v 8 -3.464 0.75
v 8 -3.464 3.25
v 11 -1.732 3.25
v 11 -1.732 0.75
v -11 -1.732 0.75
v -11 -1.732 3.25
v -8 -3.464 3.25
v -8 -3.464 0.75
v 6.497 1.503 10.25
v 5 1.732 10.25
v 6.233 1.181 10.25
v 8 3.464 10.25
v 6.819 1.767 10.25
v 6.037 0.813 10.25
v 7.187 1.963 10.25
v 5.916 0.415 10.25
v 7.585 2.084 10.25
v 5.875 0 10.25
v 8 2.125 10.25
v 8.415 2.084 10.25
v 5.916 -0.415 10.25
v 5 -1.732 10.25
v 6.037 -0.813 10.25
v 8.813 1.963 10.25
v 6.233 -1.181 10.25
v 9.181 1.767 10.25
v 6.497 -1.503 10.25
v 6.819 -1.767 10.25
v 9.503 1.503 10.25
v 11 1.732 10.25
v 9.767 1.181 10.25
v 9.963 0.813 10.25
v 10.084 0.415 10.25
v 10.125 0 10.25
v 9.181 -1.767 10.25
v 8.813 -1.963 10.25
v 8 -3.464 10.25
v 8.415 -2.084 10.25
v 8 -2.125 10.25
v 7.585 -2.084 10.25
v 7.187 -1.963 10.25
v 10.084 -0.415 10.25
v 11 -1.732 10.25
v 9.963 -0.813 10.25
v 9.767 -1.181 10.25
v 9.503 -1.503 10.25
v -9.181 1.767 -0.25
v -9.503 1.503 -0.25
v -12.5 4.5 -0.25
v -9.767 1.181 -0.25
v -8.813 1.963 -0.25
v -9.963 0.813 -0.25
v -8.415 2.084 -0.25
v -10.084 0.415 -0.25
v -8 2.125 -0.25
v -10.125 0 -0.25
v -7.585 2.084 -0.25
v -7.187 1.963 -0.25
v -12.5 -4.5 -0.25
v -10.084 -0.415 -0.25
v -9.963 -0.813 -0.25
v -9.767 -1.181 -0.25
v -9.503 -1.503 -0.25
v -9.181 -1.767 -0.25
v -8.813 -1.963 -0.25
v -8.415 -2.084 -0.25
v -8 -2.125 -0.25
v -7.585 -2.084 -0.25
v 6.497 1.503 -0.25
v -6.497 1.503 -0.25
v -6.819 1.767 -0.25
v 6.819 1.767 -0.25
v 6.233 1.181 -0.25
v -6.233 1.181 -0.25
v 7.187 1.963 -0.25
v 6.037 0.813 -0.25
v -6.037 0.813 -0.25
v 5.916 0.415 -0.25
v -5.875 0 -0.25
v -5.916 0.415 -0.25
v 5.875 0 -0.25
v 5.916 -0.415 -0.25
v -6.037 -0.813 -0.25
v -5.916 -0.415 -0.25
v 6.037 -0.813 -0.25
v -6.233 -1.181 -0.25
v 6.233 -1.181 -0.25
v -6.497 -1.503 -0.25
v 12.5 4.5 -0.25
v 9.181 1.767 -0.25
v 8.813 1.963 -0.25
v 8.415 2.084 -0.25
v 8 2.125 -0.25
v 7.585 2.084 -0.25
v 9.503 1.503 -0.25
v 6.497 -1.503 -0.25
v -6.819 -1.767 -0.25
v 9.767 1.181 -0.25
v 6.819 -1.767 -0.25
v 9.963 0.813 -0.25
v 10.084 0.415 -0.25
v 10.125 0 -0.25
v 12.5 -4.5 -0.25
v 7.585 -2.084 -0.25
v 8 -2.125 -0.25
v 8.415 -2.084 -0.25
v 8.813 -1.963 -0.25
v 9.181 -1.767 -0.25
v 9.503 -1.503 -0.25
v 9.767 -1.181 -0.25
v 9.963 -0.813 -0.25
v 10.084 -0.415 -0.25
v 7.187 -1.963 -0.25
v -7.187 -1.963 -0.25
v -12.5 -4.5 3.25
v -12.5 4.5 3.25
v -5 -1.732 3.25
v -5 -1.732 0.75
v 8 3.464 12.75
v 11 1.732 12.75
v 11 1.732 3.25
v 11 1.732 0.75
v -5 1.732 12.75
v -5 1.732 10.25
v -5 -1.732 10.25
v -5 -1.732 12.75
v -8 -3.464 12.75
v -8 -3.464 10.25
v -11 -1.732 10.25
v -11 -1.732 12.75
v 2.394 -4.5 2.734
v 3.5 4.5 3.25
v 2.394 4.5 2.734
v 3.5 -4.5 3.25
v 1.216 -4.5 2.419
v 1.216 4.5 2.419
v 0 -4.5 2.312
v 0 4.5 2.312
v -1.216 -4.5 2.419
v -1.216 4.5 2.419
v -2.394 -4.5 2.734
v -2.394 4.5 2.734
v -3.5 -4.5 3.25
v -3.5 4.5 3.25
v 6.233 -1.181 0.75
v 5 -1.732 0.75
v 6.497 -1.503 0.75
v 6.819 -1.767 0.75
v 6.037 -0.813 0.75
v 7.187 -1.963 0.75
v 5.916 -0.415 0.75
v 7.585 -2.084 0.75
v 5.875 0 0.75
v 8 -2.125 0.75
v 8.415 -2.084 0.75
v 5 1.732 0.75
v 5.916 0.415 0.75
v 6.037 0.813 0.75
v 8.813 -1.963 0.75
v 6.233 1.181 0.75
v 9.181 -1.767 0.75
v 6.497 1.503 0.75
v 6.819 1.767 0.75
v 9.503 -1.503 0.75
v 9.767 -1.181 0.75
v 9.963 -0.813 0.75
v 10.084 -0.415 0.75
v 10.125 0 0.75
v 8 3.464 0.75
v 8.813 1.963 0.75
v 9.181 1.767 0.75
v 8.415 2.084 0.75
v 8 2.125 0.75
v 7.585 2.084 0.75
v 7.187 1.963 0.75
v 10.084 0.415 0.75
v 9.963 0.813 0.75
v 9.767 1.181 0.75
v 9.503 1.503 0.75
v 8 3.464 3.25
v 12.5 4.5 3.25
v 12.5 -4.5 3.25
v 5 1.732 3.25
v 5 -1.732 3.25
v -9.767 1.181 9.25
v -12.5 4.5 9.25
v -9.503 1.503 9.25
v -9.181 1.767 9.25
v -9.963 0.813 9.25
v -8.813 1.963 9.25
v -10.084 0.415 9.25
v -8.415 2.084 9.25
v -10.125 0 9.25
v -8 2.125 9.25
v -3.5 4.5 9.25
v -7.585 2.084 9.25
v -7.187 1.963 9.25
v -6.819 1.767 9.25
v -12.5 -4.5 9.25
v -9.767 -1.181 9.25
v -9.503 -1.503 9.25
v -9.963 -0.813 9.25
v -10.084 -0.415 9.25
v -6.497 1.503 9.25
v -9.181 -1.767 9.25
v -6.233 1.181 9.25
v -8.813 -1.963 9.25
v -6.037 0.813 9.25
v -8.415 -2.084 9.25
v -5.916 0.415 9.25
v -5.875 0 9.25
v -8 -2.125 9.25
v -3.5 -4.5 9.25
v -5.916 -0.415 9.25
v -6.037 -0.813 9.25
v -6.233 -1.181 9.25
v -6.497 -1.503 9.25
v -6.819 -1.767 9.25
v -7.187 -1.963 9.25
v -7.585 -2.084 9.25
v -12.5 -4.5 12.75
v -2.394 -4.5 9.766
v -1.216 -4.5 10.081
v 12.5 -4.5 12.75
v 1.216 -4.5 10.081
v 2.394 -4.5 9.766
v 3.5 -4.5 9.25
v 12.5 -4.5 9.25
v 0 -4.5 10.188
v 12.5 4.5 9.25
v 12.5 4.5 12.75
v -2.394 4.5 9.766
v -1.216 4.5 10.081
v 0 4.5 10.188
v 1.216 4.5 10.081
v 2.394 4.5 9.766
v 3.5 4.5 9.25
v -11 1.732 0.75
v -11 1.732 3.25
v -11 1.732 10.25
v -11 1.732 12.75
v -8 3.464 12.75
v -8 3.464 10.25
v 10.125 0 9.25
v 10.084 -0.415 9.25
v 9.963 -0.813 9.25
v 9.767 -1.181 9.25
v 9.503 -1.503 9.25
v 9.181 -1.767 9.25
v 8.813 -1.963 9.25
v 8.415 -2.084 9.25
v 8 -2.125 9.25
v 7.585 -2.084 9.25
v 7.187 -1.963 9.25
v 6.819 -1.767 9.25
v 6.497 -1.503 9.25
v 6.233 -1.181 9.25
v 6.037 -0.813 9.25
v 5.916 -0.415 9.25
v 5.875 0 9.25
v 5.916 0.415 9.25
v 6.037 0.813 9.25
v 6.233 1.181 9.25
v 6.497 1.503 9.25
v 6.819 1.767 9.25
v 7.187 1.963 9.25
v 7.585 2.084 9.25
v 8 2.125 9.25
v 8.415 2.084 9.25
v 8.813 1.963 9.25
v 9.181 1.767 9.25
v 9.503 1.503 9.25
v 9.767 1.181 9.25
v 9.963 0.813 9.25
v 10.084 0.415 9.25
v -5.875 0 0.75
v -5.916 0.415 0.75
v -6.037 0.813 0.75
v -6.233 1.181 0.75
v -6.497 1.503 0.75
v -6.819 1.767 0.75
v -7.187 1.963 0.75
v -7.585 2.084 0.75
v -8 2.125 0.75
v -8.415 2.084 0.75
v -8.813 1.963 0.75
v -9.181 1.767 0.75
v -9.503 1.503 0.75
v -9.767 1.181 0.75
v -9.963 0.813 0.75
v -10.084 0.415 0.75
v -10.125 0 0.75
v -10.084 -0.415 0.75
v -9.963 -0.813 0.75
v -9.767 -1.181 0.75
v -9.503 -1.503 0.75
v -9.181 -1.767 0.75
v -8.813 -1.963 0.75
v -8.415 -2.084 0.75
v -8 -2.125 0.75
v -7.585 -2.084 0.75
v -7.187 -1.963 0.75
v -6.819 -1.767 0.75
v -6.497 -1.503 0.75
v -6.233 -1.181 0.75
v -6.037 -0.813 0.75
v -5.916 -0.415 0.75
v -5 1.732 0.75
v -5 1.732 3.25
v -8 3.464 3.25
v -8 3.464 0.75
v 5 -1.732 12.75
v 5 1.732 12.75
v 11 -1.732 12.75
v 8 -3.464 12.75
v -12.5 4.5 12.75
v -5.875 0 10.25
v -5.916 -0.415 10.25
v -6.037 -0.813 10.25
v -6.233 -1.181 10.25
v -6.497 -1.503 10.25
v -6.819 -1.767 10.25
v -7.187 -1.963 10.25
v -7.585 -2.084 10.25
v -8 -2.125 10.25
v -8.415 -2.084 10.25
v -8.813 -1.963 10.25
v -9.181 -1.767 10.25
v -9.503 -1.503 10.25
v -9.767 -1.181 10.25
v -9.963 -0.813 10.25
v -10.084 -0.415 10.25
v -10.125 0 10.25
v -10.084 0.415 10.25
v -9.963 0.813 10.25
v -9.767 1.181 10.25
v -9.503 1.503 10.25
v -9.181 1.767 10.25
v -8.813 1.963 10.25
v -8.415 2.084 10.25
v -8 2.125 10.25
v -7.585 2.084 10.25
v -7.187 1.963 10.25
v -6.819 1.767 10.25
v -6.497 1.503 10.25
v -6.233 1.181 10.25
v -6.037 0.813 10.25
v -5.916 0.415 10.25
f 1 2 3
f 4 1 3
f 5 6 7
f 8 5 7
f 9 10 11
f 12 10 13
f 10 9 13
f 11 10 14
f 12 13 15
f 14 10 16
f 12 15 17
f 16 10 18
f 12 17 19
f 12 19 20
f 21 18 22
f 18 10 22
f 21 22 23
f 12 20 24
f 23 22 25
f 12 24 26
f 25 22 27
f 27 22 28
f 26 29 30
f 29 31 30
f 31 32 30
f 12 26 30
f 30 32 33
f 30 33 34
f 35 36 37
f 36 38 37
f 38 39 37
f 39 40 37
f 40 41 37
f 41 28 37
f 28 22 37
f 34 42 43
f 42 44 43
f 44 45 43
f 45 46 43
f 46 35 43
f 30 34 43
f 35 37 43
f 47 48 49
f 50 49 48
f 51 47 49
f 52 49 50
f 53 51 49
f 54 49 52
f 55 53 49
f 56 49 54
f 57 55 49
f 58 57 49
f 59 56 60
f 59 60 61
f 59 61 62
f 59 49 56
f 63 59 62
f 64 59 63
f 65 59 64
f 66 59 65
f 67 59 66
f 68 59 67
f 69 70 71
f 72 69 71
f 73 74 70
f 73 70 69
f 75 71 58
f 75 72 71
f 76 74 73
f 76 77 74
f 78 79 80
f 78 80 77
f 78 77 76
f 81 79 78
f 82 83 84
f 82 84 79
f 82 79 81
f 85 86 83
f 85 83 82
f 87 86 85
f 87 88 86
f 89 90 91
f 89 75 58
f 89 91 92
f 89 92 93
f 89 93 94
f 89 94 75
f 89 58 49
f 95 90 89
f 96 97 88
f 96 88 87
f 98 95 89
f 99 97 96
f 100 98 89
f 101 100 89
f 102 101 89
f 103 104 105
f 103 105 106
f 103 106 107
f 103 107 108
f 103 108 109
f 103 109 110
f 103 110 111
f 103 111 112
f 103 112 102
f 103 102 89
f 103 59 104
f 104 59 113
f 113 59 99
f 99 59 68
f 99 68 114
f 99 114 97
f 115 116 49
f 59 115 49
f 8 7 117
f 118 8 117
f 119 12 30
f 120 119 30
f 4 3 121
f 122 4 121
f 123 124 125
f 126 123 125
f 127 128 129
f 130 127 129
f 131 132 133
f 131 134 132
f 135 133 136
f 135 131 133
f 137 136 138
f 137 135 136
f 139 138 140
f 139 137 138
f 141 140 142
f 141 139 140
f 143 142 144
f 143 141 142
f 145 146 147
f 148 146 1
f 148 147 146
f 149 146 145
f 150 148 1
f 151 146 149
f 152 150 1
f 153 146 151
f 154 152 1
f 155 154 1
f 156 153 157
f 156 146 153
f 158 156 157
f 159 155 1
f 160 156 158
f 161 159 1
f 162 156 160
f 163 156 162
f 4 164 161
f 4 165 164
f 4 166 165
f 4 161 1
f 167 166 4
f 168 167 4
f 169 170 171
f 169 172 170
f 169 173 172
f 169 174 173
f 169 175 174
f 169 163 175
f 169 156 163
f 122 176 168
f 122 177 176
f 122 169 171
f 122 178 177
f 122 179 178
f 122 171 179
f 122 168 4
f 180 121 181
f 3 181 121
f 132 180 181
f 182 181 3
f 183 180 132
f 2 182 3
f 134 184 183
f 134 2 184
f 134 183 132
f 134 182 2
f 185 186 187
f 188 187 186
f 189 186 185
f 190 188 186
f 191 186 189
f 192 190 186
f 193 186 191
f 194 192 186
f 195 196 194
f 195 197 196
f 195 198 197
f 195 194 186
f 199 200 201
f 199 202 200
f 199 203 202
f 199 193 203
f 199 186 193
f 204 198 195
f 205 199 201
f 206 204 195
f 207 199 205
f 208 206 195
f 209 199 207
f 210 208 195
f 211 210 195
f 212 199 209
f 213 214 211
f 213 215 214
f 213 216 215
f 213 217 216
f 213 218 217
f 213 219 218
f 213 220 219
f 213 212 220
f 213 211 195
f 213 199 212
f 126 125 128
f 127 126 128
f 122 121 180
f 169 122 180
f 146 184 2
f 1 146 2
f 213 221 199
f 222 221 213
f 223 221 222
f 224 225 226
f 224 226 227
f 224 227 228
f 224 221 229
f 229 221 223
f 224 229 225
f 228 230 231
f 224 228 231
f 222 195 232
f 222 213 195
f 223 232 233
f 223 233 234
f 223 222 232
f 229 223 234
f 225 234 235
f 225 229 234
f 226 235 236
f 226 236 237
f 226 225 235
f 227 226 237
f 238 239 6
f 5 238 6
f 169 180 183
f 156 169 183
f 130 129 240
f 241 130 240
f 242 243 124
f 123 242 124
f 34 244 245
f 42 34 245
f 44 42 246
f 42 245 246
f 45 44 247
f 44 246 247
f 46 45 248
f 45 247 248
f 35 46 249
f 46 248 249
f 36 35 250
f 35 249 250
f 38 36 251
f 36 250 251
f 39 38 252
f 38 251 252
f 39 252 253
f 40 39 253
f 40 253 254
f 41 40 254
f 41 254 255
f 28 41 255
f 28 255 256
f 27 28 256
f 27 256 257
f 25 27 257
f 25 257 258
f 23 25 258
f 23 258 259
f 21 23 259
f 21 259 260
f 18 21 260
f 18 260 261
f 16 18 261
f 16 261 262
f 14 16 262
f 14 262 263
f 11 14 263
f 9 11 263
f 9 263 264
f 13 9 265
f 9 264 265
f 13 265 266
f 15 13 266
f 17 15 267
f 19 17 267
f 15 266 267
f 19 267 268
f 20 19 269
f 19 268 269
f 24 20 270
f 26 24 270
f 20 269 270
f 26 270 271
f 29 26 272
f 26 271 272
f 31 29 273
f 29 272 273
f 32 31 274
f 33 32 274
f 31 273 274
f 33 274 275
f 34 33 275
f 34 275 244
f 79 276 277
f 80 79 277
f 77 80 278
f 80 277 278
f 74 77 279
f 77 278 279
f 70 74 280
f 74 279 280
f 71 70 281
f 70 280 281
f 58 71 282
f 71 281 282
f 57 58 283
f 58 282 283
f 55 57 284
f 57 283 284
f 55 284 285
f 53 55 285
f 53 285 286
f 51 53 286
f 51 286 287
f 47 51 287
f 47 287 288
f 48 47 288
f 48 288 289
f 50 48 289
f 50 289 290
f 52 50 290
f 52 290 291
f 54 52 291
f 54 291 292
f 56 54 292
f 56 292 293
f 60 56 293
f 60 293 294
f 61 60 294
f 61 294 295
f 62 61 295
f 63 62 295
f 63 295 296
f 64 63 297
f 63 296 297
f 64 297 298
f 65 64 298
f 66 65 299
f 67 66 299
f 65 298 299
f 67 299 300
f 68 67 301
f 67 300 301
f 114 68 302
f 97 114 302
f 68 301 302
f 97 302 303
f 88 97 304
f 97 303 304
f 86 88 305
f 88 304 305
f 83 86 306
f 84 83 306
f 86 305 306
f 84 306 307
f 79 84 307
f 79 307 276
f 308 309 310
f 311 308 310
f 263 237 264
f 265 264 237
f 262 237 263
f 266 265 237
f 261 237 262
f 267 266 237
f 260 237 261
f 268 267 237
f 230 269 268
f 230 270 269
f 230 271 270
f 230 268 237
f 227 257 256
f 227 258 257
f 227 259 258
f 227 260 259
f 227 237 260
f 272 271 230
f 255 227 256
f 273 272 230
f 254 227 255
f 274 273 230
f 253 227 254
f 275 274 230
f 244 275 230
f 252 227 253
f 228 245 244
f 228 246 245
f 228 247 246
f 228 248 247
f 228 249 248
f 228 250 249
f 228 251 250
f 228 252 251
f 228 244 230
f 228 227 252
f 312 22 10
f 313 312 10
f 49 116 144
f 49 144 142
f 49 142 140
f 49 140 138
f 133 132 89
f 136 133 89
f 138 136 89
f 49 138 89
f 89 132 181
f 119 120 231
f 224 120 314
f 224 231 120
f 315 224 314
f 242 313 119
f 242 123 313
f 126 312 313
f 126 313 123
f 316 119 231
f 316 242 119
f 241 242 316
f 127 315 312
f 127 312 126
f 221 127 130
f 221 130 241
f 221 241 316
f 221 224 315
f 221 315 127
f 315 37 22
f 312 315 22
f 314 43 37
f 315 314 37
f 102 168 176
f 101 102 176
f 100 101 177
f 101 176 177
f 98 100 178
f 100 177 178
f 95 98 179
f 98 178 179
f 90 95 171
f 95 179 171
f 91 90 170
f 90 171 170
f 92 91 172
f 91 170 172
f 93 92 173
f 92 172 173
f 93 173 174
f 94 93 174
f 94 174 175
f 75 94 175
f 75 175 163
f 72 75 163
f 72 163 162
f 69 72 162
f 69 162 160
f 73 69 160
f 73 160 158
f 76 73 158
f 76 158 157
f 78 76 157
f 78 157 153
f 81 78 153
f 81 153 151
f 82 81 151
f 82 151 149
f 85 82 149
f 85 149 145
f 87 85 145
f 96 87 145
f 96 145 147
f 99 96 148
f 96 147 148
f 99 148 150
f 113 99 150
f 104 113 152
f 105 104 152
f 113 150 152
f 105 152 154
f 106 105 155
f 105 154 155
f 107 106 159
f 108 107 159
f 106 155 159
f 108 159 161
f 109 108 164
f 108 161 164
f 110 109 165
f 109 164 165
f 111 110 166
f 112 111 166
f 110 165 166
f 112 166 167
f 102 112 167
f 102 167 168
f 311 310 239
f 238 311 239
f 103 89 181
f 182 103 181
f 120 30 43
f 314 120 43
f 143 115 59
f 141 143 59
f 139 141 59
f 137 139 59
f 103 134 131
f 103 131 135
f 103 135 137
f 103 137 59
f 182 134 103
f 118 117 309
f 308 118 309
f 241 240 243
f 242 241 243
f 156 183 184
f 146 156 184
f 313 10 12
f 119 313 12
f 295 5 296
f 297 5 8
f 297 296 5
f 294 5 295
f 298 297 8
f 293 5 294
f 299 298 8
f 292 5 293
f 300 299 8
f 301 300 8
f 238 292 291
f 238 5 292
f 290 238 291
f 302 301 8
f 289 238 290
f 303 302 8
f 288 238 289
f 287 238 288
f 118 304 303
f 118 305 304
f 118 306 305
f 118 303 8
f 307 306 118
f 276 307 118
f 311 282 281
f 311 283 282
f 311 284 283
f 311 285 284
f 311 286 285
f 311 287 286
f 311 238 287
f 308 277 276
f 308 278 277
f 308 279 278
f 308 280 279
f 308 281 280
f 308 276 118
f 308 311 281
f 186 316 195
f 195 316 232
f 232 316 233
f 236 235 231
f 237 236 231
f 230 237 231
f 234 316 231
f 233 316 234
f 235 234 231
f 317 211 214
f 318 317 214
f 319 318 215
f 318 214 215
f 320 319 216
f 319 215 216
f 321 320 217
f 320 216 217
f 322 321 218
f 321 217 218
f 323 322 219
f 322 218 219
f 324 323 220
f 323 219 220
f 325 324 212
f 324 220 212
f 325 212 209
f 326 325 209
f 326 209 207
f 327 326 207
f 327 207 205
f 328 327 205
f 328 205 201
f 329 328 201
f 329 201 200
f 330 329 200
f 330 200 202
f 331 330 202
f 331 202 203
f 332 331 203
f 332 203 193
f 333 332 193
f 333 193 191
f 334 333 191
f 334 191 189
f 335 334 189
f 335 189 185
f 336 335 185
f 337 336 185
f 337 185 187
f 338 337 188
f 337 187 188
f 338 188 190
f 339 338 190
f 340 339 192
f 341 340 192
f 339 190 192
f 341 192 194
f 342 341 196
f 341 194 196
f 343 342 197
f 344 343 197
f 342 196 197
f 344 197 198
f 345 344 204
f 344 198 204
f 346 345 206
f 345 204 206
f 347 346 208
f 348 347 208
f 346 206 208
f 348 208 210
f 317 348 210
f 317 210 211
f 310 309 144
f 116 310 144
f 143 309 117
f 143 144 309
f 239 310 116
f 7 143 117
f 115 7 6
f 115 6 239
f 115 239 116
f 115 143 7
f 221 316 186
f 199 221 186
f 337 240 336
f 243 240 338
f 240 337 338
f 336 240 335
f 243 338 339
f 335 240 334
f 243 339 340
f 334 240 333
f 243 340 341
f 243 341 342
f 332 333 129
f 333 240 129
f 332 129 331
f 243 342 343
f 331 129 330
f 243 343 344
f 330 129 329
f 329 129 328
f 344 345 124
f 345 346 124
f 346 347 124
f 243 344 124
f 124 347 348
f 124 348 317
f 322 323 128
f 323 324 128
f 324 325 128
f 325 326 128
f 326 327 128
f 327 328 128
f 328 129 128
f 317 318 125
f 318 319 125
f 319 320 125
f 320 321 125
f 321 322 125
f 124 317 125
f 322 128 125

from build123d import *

# Parameters (mm, degrees)
F0_W     = 7
F0_H     = 0.5
F1_DEPTH = 4.5
F2_R     = 2.125
F3_DEPTH = 2.5
F4_DEPTH = 3.5
F5_R     = 2.125
F6_DEPTH = 3.5
F7_START = -1
F7_DEPTH = 2.5


with BuildPart() as f1:
    # F0 (on Front) → F1 (new body, symmetric)
    with BuildSketch(Plane.XZ):
        with BuildLine():
            Line((-3.5, 3.25), (-3.5, 0.25))
            Line((-3.5, 0.25), (3.5, 0.25))
            Line((3.5, 0.25), (3.5, 3.25))
            ThreePointArc((3.5, 3.25), (0, 2.3121778265), (-3.5, 3.25))
        make_face()
        Rectangle(F0_W, F0_H)
        Polygon((-3.5, -0.25), (-3.5, 0.25), (-3.5, 3.25), (-12.5, 3.25), (-12.5, -0.25), align=None)
        Polygon((3.5, 3.25), (3.5, 0.25), (3.5, -0.25), (12.5, -0.25), (12.5, 3.25), align=None)
    extrude(amount=F1_DEPTH, both=True)

    # F2 (on face) → F3 (cut)
    with BuildSketch(Plane.XY.offset(3.25)):
        Polygon((-11, -1.7320508076), (-8, -3.4641016151), (-5, -1.7320508076), (-5, 1.7320508076), (-8, 3.4641016151), (-11, 1.7320508076), align=None)
        with Locations((-8, 0)):
            Circle(F2_R, mode=Mode.SUBTRACT)
        Polygon((5, 1.7320508076), (5, -1.7320508076), (8, -3.4641016151), (11, -1.7320508076), (11, 1.7320508076), (8, 3.4641016151), align=None)
        with Locations((8, 0)):
            Circle(F2_R, mode=Mode.SUBTRACT)
    extrude(amount=-F3_DEPTH, mode=Mode.SUBTRACT)

    # F4 (cut, through all): faces of the model
    f4_faces = [f1.faces().sort_by_distance(p)[0] for p in [
        (-8, 0, 3.25),
        (8, 0, 3.25),
    ]]
    extrude(f4_faces, amount=-F4_DEPTH, mode=Mode.SUBTRACT)


with BuildPart() as f1b:
    # F0 (on Front) → F1, piece 2 (new body, symmetric)
    with BuildSketch(Plane.XZ):
        with Locations((0, 12.5)):
            Rectangle(F0_W, F0_H)
        Polygon((3.5, 12.75), (3.5, 12.25), (3.5, 9.25), (12.5, 9.25), (12.5, 12.75), align=None)
        with BuildLine():
            Line((3.5, 9.25), (3.5, 12.25))
            Line((3.5, 12.25), (-3.5, 12.25))
            Line((-3.5, 12.25), (-3.5, 9.25))
            ThreePointArc((-3.5, 9.25), (0, 10.1878221735), (3.5, 9.25))
        make_face()
        Polygon((-3.5, 9.25), (-3.5, 12.25), (-3.5, 12.75), (-12.5, 12.75), (-12.5, 9.25), align=None)
    extrude(amount=F1_DEPTH, both=True)

    # F5 (on face) → F6 (cut, through all)
    with BuildSketch(Plane(origin=(0, 0, 9.25), x_dir=(1, 0, 0), z_dir=(0, 0, -1))):
        with Locations((-8, 0)):
            Circle(F5_R)
        with Locations((8, 0)):
            Circle(F5_R)
    extrude(amount=-F6_DEPTH, mode=Mode.SUBTRACT)

    # F5 (on face) → F7 (cut)
    with BuildSketch(Plane(origin=(0, 0, 9.25), x_dir=(1, 0, 0), z_dir=(0, 0, -1)).offset(F7_START)):
        Polygon((-5, -1.7320508076), (-5, 1.7320508076), (-8, 3.4641016151), (-11, 1.7320508076), (-11, -1.7320508076), (-8, -3.4641016151), align=None)
        with Locations((-8, 0)):
            Circle(F5_R, mode=Mode.SUBTRACT)
        Polygon((11, -1.7320508076), (11, 1.7320508076), (8, 3.4641016151), (5, 1.7320508076), (5, -1.7320508076), (8, -3.4641016151), align=None)
        with Locations((8, 0)):
            Circle(F5_R, mode=Mode.SUBTRACT)
    extrude(amount=-F7_DEPTH, mode=Mode.SUBTRACT)


solid = Compound([f1.part, f1b.part])
